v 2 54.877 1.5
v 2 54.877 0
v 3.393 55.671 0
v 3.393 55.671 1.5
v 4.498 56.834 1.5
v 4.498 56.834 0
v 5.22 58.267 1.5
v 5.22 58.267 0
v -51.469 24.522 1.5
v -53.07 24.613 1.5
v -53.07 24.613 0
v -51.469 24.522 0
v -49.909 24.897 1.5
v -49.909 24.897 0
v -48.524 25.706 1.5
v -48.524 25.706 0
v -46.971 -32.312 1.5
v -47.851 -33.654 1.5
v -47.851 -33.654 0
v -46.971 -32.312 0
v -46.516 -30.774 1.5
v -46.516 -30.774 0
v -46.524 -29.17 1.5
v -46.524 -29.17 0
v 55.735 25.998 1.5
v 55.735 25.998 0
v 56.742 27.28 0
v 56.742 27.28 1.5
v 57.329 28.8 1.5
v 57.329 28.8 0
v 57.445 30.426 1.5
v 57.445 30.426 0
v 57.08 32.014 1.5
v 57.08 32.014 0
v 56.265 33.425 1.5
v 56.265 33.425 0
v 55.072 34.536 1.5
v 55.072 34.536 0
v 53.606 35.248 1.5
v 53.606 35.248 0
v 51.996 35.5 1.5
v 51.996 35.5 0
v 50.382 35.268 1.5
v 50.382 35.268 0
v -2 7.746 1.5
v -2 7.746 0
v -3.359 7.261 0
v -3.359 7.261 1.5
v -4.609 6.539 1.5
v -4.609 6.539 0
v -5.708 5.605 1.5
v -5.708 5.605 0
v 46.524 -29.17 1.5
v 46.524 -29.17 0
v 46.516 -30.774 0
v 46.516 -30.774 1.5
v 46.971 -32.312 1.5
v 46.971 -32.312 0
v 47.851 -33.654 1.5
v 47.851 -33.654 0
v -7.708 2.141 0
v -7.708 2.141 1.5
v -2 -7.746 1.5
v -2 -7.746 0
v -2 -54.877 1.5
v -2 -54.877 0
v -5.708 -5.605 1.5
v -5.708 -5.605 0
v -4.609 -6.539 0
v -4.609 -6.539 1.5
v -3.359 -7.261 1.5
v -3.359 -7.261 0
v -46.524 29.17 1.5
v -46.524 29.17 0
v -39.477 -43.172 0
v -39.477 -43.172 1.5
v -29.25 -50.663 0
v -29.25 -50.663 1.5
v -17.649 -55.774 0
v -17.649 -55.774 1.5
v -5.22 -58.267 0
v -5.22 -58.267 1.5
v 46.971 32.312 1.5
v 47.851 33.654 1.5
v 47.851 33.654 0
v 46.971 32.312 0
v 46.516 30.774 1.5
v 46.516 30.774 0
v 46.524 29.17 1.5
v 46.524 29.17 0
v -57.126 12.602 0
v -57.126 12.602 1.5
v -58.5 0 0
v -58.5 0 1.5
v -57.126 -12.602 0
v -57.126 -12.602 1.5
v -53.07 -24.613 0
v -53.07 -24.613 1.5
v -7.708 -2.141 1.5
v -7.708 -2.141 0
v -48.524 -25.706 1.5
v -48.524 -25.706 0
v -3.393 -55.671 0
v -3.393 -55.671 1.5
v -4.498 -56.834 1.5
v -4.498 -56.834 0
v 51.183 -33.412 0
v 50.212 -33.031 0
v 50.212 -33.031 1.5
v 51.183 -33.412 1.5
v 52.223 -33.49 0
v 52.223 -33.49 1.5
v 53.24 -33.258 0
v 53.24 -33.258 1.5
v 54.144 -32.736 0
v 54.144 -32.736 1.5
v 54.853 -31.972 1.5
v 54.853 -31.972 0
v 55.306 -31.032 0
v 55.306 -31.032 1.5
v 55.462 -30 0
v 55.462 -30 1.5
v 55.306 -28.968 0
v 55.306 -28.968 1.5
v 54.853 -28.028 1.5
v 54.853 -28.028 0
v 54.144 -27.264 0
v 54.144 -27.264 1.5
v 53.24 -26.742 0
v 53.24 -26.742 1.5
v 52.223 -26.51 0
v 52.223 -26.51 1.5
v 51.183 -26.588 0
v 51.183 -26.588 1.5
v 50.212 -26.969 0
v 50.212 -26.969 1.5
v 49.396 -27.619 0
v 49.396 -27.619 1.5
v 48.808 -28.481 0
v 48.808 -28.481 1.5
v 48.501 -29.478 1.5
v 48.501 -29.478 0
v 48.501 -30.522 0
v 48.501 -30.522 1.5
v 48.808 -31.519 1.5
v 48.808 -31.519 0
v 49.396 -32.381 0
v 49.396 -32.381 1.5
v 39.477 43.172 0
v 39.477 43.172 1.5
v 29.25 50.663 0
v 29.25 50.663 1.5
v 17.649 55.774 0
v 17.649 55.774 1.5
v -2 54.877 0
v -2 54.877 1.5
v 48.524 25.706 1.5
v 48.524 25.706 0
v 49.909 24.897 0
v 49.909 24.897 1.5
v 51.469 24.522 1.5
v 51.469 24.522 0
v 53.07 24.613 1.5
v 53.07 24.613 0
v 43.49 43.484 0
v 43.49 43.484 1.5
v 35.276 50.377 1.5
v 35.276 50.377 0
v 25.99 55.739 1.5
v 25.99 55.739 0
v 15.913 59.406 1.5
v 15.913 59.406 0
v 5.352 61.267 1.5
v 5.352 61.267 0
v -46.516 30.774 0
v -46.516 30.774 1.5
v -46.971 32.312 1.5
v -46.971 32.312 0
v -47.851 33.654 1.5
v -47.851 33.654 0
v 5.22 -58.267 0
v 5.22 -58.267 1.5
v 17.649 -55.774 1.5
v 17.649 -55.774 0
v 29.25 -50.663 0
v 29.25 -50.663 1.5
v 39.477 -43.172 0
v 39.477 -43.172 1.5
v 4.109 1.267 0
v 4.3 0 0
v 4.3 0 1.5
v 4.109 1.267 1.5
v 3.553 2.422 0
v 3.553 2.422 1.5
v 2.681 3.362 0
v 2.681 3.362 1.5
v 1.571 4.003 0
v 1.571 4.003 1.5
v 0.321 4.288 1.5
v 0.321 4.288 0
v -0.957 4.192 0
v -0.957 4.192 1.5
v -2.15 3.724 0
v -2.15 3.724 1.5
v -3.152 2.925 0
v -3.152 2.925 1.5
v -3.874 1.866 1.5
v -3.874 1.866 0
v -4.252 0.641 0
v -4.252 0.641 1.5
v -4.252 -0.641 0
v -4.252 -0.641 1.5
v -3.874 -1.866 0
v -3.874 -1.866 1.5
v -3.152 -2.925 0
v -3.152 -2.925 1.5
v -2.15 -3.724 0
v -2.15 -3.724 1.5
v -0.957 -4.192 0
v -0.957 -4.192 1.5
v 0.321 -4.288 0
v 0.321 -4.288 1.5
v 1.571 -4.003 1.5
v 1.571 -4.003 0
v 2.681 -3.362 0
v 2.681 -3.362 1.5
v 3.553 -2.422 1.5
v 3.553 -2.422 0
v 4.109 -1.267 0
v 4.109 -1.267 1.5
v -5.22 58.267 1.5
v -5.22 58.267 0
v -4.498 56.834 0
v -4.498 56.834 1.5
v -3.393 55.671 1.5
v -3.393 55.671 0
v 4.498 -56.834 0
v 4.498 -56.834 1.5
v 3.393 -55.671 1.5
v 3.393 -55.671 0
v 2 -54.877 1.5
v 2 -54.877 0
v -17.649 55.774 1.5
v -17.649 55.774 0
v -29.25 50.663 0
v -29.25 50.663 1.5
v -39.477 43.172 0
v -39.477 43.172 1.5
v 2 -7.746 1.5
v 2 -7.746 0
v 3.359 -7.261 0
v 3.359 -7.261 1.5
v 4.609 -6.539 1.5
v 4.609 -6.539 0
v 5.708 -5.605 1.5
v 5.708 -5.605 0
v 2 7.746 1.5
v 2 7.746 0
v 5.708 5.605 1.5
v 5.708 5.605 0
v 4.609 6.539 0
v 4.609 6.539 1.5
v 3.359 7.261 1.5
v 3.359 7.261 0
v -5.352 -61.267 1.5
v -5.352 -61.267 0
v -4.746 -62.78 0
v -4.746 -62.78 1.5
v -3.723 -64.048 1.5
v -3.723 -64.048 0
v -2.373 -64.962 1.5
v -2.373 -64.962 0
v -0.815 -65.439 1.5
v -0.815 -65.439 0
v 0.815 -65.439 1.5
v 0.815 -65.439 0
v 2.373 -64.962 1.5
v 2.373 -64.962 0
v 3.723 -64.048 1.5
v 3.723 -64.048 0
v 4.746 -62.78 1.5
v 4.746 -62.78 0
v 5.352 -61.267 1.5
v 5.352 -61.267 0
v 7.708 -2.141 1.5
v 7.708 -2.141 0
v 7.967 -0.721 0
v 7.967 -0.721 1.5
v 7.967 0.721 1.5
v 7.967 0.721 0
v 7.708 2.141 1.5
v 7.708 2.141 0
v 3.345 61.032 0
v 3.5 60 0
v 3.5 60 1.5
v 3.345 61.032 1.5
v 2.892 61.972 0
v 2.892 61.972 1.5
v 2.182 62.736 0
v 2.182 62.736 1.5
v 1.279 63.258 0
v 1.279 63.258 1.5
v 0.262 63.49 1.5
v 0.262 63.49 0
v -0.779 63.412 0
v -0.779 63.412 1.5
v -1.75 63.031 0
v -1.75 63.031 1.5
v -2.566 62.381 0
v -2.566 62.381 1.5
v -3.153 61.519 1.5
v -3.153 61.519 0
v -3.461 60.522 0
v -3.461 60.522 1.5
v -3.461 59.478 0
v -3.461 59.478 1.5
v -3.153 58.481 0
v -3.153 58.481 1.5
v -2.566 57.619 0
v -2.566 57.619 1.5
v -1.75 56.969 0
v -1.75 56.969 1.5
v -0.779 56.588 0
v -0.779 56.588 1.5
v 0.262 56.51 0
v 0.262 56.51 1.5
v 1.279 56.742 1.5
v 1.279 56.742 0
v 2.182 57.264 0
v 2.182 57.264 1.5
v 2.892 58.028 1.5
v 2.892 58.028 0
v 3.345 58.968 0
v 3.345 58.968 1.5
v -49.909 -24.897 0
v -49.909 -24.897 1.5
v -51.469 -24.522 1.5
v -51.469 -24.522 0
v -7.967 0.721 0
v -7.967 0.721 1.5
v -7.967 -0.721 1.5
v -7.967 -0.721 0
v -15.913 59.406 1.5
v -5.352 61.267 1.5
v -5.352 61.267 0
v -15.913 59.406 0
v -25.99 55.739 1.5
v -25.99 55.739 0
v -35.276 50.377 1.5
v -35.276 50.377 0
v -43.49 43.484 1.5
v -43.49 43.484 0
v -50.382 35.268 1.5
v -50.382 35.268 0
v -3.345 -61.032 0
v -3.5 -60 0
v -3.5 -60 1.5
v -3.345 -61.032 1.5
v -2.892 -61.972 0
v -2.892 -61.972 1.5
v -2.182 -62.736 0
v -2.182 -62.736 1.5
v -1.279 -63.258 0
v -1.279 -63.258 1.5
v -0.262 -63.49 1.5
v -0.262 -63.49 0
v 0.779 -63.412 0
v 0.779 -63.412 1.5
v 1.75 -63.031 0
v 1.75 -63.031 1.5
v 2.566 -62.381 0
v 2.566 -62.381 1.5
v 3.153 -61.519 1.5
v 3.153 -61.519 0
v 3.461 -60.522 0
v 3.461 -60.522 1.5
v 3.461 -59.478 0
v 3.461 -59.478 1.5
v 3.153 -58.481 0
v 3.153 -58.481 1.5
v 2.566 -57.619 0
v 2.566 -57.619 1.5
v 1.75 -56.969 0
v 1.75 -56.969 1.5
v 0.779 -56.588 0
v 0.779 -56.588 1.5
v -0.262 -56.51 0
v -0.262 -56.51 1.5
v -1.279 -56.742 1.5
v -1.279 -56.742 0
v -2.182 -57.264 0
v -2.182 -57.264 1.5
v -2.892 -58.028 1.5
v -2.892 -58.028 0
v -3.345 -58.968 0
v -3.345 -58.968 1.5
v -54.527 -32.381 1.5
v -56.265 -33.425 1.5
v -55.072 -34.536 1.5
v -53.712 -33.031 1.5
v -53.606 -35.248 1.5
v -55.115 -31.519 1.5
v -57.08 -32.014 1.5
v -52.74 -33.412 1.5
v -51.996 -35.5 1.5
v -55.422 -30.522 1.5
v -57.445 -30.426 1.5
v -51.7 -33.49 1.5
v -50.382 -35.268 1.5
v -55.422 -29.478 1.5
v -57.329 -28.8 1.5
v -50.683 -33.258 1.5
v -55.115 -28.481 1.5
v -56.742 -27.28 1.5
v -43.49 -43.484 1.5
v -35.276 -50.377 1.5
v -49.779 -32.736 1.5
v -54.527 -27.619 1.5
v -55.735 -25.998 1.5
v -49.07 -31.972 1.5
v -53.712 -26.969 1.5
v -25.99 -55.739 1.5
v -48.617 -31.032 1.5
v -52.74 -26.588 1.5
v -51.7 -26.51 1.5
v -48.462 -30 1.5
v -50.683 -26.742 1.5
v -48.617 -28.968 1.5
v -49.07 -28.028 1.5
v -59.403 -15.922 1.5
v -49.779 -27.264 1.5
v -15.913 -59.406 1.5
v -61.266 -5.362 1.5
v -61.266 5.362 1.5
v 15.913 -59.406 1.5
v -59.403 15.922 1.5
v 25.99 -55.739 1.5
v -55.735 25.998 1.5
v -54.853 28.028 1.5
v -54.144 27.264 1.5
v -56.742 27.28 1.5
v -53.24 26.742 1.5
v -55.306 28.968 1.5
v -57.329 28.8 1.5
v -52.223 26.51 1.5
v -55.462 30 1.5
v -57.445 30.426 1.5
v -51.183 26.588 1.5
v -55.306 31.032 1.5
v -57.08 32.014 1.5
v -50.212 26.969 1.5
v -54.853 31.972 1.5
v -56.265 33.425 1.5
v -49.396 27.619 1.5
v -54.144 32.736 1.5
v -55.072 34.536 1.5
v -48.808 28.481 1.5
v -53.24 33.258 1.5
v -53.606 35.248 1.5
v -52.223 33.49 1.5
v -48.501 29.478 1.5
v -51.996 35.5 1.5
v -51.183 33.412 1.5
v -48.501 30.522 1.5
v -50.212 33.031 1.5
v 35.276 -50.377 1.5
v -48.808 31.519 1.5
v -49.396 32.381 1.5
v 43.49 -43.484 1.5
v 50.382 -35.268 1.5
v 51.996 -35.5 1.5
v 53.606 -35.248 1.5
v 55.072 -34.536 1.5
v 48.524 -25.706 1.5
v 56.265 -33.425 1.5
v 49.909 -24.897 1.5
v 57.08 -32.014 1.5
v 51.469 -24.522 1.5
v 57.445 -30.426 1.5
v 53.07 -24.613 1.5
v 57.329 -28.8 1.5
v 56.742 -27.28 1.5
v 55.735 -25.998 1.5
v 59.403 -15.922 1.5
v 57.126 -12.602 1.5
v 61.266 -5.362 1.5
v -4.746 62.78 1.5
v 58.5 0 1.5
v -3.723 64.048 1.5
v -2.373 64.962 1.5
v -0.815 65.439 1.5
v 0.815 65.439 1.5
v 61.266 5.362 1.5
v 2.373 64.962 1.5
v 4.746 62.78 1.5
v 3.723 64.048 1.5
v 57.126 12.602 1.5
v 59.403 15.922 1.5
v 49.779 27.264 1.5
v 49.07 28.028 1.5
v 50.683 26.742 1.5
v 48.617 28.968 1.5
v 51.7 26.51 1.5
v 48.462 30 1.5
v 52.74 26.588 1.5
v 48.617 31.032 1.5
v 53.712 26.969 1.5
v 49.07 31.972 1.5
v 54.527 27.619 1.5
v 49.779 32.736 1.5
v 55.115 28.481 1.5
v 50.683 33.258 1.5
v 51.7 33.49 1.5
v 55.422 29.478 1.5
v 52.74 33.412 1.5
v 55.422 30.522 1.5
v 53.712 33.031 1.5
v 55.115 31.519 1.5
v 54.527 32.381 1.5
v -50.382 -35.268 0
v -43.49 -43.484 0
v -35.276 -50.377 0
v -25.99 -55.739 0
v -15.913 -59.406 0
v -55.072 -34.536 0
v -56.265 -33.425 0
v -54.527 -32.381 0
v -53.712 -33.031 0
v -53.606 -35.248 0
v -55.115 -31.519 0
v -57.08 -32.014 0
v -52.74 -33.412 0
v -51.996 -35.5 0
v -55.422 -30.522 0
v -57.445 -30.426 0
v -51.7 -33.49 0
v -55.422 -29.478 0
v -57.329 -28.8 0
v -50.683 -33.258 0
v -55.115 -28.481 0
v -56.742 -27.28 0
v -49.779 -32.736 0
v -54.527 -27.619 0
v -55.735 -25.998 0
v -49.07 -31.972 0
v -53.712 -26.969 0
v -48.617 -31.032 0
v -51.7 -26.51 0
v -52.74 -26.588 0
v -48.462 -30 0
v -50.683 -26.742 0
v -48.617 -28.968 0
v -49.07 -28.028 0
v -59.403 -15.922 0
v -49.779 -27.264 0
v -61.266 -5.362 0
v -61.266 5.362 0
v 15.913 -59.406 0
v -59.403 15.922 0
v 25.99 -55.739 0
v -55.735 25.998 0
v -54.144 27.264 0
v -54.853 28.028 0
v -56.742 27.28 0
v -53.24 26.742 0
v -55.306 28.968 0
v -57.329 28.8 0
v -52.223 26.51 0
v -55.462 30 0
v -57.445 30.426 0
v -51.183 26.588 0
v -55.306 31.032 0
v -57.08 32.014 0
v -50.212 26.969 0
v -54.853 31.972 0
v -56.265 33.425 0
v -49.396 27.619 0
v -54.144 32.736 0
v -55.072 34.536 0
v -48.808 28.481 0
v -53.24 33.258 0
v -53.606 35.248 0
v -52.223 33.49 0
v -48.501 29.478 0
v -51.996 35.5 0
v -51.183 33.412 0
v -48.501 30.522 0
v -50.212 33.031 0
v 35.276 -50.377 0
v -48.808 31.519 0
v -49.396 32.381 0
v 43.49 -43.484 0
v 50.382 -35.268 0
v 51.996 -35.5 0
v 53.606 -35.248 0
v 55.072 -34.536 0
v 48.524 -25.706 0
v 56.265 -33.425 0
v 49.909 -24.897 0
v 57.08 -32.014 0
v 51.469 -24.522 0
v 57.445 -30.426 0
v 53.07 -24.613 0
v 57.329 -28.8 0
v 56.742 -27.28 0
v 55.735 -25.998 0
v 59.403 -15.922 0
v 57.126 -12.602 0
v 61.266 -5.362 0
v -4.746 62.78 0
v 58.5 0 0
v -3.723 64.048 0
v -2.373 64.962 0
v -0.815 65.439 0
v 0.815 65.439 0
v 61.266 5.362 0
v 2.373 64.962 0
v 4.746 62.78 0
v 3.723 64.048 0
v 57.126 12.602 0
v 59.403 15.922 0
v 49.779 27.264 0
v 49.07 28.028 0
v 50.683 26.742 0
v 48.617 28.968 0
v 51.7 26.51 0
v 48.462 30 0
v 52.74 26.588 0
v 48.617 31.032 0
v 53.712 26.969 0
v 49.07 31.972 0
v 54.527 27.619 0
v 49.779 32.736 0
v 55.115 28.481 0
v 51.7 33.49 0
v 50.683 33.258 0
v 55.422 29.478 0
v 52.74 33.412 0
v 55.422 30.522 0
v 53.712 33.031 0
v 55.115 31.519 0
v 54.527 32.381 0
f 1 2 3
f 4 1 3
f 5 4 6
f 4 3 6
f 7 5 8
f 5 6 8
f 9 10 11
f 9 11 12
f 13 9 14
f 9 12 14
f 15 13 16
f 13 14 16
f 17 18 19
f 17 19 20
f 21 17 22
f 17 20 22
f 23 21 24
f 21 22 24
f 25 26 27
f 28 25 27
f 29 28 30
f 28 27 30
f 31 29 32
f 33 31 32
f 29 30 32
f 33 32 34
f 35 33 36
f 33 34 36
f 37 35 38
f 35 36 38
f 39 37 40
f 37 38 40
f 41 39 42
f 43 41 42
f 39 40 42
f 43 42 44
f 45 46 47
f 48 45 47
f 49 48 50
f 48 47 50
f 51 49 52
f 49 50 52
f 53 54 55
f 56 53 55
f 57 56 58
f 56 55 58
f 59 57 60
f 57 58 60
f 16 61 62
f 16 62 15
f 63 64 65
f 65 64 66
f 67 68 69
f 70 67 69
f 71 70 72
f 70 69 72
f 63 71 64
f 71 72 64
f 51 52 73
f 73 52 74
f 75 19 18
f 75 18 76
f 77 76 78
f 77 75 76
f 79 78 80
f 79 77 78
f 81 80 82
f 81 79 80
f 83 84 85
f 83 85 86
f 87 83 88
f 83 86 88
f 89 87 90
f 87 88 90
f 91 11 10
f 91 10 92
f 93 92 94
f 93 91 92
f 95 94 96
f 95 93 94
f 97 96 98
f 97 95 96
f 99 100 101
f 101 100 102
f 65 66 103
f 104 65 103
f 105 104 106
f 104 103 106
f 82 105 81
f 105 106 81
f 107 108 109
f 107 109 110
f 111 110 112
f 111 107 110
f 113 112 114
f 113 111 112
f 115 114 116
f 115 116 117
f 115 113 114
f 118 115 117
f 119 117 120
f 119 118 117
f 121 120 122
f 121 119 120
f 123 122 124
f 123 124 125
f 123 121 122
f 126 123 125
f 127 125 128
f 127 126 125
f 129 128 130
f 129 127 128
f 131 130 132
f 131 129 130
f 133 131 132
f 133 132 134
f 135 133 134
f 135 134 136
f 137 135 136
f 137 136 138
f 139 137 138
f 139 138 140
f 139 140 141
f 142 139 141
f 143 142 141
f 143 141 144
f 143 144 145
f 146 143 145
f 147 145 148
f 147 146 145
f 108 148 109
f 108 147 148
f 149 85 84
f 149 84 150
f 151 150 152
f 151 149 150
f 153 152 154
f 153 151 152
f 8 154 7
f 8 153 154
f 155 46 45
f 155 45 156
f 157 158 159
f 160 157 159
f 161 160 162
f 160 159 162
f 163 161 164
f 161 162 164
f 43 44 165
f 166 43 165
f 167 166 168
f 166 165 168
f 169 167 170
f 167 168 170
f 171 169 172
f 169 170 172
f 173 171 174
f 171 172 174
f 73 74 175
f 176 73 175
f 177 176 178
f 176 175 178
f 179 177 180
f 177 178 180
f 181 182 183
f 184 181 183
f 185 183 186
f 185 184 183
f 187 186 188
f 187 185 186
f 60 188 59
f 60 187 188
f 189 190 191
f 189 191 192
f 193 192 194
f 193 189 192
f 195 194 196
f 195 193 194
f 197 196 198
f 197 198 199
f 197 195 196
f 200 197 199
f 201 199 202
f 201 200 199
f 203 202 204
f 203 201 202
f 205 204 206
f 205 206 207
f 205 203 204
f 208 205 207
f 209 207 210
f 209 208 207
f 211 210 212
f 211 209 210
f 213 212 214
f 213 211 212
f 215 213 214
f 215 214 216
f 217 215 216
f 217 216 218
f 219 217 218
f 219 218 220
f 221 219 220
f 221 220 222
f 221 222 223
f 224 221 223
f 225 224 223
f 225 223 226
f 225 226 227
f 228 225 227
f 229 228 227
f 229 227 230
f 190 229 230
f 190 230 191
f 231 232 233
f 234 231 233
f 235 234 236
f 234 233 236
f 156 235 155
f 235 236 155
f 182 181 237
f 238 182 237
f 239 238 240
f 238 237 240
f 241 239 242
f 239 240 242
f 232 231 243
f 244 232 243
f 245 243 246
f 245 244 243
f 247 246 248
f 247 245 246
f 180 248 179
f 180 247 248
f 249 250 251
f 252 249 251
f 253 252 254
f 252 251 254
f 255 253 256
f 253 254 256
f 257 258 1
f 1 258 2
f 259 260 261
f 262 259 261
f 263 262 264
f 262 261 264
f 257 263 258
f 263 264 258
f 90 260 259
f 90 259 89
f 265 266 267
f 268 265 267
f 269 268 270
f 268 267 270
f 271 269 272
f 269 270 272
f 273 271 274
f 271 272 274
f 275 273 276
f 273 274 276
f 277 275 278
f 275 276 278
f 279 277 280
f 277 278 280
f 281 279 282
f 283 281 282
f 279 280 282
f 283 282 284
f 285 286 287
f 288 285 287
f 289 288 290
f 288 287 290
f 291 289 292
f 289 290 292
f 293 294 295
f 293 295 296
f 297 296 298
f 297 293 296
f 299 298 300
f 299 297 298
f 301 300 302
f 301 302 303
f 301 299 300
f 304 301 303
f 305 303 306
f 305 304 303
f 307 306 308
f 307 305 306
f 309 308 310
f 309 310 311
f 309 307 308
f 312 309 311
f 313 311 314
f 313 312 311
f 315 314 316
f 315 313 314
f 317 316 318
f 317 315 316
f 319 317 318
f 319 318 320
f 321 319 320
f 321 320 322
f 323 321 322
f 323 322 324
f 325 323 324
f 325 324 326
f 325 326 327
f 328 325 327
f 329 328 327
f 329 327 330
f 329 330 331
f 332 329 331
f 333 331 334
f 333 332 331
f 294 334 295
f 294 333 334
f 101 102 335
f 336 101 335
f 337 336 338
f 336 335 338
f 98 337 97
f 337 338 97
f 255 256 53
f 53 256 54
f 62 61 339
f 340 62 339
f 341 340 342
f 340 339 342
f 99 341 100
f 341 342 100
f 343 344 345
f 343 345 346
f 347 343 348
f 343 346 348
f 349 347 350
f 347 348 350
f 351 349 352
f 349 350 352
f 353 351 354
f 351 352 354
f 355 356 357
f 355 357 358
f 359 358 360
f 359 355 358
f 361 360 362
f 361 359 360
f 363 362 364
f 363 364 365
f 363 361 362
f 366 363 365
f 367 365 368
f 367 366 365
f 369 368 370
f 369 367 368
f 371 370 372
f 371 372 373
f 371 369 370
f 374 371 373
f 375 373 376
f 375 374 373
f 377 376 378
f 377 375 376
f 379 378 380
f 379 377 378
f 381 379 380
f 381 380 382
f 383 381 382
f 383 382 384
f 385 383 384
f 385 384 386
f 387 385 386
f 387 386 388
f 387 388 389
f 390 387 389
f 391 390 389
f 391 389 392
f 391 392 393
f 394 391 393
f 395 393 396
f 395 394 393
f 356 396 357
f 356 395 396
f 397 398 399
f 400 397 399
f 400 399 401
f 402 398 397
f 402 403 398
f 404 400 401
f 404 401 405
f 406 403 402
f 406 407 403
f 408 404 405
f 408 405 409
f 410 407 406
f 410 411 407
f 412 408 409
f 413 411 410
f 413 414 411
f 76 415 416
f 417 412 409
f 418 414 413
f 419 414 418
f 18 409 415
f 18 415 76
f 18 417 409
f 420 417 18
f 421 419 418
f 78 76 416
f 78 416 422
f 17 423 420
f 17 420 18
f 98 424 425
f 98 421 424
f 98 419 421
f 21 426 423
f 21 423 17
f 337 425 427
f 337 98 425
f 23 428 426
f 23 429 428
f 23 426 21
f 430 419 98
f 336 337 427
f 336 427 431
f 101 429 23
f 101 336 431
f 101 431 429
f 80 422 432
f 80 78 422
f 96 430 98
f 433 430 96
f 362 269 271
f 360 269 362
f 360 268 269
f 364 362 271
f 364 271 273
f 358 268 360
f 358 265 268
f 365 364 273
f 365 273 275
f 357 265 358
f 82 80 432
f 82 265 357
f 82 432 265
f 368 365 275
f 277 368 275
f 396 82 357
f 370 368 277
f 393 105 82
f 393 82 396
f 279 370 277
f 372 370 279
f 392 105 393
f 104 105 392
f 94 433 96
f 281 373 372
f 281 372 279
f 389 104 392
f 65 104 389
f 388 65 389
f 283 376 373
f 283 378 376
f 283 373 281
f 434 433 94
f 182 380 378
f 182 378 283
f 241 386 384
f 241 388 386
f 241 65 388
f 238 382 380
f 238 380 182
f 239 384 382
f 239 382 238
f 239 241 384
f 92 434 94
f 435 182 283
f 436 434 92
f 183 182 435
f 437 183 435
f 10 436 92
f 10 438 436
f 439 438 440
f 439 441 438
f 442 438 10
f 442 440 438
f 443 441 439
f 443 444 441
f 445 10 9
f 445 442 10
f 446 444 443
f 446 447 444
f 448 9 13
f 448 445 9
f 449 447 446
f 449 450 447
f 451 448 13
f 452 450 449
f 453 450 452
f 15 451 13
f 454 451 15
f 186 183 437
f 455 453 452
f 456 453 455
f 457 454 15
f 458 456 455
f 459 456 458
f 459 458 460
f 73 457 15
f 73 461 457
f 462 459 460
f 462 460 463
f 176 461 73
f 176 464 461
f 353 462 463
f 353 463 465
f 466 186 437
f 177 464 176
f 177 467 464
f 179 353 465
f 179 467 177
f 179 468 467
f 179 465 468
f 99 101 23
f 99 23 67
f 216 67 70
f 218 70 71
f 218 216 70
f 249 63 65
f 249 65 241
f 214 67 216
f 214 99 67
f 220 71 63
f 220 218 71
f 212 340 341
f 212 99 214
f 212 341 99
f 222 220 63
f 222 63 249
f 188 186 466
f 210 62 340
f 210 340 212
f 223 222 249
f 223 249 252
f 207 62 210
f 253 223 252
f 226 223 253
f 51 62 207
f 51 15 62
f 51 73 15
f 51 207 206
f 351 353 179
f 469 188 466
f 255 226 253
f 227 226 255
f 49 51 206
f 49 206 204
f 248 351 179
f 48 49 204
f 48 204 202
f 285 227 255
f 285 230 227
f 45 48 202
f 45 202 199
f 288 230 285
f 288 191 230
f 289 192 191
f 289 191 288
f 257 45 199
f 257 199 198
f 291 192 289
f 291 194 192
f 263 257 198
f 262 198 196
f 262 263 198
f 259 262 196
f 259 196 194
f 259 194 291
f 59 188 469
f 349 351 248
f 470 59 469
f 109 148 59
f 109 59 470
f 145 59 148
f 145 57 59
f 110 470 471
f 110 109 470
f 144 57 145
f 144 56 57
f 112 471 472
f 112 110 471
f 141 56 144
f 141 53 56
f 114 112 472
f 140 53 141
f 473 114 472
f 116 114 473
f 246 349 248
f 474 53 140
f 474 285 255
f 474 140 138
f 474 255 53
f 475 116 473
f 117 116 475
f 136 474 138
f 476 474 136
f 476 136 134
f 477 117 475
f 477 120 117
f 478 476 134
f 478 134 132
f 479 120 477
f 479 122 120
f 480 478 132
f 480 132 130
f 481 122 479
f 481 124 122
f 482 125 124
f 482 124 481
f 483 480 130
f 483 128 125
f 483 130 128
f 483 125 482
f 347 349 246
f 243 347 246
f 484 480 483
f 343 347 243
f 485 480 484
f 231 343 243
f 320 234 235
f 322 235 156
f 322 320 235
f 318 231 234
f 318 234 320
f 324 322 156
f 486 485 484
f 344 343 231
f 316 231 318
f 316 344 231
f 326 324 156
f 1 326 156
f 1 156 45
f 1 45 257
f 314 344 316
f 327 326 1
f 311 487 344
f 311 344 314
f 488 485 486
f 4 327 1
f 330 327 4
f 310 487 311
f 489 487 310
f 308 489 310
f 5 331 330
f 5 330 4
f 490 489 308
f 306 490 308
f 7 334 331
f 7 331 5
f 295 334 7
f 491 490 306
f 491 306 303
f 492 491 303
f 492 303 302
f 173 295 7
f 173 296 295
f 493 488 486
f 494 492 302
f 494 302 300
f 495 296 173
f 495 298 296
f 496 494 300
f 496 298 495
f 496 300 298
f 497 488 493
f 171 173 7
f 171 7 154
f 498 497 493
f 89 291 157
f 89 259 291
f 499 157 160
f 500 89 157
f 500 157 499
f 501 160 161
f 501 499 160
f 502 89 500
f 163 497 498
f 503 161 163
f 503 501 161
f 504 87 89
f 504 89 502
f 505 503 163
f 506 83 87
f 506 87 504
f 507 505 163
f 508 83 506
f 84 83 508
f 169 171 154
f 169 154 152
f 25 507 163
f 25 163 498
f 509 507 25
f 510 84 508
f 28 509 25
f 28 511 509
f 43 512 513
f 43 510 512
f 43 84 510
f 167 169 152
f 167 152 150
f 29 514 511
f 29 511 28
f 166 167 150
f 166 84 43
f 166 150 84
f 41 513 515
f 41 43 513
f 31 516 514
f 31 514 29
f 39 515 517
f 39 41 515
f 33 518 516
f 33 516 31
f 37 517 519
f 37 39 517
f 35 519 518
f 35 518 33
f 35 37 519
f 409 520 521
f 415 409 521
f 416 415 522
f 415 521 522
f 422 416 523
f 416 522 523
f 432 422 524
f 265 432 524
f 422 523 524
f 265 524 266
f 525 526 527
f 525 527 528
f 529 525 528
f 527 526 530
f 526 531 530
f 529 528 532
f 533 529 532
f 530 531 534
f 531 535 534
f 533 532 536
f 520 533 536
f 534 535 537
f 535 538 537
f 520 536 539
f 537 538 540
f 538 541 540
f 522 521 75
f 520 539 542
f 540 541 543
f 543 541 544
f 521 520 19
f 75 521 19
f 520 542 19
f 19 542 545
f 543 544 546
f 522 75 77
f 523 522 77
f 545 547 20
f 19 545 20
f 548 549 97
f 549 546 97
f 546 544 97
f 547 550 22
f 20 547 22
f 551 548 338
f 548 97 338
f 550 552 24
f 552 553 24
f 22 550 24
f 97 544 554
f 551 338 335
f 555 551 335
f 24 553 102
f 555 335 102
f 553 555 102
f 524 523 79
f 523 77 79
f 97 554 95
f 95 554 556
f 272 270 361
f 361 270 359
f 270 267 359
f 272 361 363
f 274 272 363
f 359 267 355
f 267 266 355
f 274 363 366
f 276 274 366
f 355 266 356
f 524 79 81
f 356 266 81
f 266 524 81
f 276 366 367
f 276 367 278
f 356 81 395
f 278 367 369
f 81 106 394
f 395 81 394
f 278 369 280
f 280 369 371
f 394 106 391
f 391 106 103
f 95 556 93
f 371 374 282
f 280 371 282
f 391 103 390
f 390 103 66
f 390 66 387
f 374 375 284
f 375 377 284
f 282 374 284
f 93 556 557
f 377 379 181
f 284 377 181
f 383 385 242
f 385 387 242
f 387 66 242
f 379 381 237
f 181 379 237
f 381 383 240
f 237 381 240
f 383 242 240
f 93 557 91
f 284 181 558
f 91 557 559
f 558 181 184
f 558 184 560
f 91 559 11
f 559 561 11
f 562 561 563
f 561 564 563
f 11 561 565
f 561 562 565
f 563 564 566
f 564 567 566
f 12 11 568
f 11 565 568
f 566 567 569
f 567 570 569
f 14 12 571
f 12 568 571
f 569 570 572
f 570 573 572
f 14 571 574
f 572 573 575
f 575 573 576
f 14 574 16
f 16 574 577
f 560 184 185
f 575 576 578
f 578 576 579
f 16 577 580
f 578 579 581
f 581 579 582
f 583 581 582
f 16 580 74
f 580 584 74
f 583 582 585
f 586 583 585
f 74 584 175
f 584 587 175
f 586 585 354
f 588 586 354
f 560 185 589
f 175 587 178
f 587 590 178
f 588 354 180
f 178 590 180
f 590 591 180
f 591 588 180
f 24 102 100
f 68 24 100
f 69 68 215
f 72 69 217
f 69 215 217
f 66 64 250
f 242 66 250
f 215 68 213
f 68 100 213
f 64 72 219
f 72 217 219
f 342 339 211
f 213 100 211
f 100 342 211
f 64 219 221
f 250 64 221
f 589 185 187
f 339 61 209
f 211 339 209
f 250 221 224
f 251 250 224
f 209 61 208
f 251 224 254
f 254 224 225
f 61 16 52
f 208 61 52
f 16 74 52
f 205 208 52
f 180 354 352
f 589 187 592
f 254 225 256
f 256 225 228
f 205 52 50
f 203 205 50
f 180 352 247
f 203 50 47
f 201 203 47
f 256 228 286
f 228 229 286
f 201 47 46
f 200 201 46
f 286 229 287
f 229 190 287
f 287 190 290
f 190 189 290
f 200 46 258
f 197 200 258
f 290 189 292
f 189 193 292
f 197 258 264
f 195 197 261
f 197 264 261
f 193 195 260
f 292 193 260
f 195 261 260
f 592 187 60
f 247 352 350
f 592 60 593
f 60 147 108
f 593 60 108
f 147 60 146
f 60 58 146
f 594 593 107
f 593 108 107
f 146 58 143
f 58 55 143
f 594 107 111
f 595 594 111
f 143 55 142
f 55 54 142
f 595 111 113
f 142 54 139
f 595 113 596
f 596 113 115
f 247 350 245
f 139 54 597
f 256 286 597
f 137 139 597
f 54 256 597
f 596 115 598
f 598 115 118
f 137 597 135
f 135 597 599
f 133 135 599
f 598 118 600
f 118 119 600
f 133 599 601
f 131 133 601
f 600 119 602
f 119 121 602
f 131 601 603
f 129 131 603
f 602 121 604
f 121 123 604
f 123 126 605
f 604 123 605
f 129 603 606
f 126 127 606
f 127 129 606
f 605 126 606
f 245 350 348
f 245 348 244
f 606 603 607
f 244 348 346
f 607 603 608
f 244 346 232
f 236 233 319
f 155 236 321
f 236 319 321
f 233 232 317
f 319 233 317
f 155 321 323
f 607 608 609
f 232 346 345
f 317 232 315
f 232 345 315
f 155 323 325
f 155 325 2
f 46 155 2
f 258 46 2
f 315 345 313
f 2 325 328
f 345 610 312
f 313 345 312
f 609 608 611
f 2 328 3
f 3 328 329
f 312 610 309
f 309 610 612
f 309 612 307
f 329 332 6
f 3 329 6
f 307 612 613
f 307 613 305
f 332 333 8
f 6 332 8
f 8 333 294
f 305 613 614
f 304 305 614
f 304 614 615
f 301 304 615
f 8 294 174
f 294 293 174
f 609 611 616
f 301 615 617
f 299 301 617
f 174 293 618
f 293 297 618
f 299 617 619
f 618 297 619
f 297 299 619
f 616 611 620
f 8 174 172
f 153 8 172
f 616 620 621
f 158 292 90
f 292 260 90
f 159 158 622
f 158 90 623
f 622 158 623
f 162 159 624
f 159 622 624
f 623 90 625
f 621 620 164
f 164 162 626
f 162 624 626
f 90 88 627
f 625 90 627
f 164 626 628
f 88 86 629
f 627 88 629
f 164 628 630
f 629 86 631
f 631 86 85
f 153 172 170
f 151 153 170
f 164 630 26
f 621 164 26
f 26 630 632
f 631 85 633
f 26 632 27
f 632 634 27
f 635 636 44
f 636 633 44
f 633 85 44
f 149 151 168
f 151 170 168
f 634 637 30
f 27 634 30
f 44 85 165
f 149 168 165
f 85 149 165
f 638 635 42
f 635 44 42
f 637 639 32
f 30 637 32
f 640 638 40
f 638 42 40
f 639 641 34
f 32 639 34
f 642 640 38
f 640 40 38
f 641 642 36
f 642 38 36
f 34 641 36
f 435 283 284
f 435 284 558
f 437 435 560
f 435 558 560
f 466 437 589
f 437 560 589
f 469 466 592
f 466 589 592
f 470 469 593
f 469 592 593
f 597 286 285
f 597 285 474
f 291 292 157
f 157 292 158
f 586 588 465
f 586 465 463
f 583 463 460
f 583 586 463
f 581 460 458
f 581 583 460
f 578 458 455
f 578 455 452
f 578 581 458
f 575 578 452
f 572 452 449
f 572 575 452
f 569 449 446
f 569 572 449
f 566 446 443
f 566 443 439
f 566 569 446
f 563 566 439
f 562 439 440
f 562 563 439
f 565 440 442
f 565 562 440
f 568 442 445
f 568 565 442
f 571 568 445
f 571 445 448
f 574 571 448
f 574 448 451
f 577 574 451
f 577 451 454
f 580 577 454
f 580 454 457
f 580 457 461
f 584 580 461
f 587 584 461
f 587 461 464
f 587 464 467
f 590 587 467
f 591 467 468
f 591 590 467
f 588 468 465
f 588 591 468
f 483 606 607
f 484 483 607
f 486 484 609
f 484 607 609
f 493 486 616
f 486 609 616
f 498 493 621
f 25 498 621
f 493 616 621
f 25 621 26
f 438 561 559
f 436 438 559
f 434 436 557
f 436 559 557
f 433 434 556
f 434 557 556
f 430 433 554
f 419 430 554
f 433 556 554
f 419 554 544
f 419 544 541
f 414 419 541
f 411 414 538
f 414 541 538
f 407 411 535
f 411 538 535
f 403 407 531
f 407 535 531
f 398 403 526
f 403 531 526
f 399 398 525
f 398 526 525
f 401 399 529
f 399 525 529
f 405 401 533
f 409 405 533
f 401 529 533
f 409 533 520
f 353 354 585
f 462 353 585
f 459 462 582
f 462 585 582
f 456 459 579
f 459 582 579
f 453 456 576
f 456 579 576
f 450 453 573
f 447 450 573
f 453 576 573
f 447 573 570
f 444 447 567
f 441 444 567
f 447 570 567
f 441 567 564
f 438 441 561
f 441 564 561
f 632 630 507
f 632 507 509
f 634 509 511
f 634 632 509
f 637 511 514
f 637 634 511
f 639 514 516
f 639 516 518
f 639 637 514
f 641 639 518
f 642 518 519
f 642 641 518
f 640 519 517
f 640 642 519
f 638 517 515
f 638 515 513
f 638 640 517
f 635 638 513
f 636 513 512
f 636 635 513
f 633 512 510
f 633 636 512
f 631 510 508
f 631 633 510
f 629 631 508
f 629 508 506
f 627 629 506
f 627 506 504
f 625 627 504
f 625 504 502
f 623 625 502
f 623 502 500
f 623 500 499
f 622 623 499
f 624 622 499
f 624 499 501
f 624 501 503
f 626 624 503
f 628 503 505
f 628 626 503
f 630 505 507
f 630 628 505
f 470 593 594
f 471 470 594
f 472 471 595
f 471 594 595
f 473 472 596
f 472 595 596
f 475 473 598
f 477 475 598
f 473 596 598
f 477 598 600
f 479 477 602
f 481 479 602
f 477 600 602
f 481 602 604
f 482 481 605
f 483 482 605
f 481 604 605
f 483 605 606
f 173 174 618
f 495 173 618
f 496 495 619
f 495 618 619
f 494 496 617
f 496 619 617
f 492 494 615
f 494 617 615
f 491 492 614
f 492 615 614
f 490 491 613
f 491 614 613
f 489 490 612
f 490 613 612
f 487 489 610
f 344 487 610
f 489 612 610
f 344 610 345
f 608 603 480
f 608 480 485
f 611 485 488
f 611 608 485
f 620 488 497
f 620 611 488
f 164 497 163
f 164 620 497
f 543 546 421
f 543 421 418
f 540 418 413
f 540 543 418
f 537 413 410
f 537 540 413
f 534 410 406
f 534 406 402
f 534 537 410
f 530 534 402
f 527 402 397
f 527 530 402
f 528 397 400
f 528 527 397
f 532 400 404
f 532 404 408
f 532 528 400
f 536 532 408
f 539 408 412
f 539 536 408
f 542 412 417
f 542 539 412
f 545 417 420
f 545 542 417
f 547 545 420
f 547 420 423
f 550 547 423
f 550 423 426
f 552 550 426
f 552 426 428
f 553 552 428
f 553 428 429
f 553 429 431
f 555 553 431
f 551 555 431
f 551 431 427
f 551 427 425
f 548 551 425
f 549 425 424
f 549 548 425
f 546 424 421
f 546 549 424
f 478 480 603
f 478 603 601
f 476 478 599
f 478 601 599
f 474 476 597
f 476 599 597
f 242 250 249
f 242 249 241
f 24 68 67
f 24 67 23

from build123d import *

# Parameters (mm, degrees)
SKETCH_R           = 4.3
SKETCH_R_2         = 3.5
PAD_DEPTH          = 1.5
POLARPATTERN_COUNT = 6


with BuildPart() as part:
    # Sketch → Pad (new body)
    with BuildSketch(Plane.XY):
        with BuildLine():
            ThreePointArc((6.6323005804, 4.4735432278), (4.6158793486, 6.534038402), (2, 7.7459666924))
            Line((2, 7.7459666924), (2, 54.876524617))
            ThreePointArc((2, 54.876524617), (3.9880427931, 56.2124526827), (5.2197393691, 58.2667022995))
            ThreePointArc((48.4987282929, 32.7128052896), (29.7433833833, 50.3744520651), (5.2197393691, 58.2667022995))
            Line((48.4987282929, 32.7128052896), (50.9858410106, 34.390384))
            ThreePointArc((50.9858410106, 34.390384), (31.210195847, 52.9922463235), (5.3521454254, 61.2667041268))
            ThreePointArc((5.3521454254, 61.2667041268), (-3.6080213802, 64.1511663084), (-2, 54.876524617))
            Line((-2, 7.7459666924), (-2, 54.876524617))
            ThreePointArc((-2, 7.7459666924), (-2.8357963608, -7.4805253158), (6.6323005804, 4.4735432278))
        make_face()
        Circle(SKETCH_R, mode=Mode.SUBTRACT)
        with Locations((0, 60)):
            Circle(SKETCH_R_2, mode=Mode.SUBTRACT)
    pad = extrude(amount=PAD_DEPTH)

    # PolarPattern: Pad ×6 about axis
    polarpattern_axis = Axis((0, 0, 0), (0, 0, 1))
    for i in range(1, POLARPATTERN_COUNT):
        add(pad.rotate(polarpattern_axis, i * 360 / POLARPATTERN_COUNT))


solid = part.part
